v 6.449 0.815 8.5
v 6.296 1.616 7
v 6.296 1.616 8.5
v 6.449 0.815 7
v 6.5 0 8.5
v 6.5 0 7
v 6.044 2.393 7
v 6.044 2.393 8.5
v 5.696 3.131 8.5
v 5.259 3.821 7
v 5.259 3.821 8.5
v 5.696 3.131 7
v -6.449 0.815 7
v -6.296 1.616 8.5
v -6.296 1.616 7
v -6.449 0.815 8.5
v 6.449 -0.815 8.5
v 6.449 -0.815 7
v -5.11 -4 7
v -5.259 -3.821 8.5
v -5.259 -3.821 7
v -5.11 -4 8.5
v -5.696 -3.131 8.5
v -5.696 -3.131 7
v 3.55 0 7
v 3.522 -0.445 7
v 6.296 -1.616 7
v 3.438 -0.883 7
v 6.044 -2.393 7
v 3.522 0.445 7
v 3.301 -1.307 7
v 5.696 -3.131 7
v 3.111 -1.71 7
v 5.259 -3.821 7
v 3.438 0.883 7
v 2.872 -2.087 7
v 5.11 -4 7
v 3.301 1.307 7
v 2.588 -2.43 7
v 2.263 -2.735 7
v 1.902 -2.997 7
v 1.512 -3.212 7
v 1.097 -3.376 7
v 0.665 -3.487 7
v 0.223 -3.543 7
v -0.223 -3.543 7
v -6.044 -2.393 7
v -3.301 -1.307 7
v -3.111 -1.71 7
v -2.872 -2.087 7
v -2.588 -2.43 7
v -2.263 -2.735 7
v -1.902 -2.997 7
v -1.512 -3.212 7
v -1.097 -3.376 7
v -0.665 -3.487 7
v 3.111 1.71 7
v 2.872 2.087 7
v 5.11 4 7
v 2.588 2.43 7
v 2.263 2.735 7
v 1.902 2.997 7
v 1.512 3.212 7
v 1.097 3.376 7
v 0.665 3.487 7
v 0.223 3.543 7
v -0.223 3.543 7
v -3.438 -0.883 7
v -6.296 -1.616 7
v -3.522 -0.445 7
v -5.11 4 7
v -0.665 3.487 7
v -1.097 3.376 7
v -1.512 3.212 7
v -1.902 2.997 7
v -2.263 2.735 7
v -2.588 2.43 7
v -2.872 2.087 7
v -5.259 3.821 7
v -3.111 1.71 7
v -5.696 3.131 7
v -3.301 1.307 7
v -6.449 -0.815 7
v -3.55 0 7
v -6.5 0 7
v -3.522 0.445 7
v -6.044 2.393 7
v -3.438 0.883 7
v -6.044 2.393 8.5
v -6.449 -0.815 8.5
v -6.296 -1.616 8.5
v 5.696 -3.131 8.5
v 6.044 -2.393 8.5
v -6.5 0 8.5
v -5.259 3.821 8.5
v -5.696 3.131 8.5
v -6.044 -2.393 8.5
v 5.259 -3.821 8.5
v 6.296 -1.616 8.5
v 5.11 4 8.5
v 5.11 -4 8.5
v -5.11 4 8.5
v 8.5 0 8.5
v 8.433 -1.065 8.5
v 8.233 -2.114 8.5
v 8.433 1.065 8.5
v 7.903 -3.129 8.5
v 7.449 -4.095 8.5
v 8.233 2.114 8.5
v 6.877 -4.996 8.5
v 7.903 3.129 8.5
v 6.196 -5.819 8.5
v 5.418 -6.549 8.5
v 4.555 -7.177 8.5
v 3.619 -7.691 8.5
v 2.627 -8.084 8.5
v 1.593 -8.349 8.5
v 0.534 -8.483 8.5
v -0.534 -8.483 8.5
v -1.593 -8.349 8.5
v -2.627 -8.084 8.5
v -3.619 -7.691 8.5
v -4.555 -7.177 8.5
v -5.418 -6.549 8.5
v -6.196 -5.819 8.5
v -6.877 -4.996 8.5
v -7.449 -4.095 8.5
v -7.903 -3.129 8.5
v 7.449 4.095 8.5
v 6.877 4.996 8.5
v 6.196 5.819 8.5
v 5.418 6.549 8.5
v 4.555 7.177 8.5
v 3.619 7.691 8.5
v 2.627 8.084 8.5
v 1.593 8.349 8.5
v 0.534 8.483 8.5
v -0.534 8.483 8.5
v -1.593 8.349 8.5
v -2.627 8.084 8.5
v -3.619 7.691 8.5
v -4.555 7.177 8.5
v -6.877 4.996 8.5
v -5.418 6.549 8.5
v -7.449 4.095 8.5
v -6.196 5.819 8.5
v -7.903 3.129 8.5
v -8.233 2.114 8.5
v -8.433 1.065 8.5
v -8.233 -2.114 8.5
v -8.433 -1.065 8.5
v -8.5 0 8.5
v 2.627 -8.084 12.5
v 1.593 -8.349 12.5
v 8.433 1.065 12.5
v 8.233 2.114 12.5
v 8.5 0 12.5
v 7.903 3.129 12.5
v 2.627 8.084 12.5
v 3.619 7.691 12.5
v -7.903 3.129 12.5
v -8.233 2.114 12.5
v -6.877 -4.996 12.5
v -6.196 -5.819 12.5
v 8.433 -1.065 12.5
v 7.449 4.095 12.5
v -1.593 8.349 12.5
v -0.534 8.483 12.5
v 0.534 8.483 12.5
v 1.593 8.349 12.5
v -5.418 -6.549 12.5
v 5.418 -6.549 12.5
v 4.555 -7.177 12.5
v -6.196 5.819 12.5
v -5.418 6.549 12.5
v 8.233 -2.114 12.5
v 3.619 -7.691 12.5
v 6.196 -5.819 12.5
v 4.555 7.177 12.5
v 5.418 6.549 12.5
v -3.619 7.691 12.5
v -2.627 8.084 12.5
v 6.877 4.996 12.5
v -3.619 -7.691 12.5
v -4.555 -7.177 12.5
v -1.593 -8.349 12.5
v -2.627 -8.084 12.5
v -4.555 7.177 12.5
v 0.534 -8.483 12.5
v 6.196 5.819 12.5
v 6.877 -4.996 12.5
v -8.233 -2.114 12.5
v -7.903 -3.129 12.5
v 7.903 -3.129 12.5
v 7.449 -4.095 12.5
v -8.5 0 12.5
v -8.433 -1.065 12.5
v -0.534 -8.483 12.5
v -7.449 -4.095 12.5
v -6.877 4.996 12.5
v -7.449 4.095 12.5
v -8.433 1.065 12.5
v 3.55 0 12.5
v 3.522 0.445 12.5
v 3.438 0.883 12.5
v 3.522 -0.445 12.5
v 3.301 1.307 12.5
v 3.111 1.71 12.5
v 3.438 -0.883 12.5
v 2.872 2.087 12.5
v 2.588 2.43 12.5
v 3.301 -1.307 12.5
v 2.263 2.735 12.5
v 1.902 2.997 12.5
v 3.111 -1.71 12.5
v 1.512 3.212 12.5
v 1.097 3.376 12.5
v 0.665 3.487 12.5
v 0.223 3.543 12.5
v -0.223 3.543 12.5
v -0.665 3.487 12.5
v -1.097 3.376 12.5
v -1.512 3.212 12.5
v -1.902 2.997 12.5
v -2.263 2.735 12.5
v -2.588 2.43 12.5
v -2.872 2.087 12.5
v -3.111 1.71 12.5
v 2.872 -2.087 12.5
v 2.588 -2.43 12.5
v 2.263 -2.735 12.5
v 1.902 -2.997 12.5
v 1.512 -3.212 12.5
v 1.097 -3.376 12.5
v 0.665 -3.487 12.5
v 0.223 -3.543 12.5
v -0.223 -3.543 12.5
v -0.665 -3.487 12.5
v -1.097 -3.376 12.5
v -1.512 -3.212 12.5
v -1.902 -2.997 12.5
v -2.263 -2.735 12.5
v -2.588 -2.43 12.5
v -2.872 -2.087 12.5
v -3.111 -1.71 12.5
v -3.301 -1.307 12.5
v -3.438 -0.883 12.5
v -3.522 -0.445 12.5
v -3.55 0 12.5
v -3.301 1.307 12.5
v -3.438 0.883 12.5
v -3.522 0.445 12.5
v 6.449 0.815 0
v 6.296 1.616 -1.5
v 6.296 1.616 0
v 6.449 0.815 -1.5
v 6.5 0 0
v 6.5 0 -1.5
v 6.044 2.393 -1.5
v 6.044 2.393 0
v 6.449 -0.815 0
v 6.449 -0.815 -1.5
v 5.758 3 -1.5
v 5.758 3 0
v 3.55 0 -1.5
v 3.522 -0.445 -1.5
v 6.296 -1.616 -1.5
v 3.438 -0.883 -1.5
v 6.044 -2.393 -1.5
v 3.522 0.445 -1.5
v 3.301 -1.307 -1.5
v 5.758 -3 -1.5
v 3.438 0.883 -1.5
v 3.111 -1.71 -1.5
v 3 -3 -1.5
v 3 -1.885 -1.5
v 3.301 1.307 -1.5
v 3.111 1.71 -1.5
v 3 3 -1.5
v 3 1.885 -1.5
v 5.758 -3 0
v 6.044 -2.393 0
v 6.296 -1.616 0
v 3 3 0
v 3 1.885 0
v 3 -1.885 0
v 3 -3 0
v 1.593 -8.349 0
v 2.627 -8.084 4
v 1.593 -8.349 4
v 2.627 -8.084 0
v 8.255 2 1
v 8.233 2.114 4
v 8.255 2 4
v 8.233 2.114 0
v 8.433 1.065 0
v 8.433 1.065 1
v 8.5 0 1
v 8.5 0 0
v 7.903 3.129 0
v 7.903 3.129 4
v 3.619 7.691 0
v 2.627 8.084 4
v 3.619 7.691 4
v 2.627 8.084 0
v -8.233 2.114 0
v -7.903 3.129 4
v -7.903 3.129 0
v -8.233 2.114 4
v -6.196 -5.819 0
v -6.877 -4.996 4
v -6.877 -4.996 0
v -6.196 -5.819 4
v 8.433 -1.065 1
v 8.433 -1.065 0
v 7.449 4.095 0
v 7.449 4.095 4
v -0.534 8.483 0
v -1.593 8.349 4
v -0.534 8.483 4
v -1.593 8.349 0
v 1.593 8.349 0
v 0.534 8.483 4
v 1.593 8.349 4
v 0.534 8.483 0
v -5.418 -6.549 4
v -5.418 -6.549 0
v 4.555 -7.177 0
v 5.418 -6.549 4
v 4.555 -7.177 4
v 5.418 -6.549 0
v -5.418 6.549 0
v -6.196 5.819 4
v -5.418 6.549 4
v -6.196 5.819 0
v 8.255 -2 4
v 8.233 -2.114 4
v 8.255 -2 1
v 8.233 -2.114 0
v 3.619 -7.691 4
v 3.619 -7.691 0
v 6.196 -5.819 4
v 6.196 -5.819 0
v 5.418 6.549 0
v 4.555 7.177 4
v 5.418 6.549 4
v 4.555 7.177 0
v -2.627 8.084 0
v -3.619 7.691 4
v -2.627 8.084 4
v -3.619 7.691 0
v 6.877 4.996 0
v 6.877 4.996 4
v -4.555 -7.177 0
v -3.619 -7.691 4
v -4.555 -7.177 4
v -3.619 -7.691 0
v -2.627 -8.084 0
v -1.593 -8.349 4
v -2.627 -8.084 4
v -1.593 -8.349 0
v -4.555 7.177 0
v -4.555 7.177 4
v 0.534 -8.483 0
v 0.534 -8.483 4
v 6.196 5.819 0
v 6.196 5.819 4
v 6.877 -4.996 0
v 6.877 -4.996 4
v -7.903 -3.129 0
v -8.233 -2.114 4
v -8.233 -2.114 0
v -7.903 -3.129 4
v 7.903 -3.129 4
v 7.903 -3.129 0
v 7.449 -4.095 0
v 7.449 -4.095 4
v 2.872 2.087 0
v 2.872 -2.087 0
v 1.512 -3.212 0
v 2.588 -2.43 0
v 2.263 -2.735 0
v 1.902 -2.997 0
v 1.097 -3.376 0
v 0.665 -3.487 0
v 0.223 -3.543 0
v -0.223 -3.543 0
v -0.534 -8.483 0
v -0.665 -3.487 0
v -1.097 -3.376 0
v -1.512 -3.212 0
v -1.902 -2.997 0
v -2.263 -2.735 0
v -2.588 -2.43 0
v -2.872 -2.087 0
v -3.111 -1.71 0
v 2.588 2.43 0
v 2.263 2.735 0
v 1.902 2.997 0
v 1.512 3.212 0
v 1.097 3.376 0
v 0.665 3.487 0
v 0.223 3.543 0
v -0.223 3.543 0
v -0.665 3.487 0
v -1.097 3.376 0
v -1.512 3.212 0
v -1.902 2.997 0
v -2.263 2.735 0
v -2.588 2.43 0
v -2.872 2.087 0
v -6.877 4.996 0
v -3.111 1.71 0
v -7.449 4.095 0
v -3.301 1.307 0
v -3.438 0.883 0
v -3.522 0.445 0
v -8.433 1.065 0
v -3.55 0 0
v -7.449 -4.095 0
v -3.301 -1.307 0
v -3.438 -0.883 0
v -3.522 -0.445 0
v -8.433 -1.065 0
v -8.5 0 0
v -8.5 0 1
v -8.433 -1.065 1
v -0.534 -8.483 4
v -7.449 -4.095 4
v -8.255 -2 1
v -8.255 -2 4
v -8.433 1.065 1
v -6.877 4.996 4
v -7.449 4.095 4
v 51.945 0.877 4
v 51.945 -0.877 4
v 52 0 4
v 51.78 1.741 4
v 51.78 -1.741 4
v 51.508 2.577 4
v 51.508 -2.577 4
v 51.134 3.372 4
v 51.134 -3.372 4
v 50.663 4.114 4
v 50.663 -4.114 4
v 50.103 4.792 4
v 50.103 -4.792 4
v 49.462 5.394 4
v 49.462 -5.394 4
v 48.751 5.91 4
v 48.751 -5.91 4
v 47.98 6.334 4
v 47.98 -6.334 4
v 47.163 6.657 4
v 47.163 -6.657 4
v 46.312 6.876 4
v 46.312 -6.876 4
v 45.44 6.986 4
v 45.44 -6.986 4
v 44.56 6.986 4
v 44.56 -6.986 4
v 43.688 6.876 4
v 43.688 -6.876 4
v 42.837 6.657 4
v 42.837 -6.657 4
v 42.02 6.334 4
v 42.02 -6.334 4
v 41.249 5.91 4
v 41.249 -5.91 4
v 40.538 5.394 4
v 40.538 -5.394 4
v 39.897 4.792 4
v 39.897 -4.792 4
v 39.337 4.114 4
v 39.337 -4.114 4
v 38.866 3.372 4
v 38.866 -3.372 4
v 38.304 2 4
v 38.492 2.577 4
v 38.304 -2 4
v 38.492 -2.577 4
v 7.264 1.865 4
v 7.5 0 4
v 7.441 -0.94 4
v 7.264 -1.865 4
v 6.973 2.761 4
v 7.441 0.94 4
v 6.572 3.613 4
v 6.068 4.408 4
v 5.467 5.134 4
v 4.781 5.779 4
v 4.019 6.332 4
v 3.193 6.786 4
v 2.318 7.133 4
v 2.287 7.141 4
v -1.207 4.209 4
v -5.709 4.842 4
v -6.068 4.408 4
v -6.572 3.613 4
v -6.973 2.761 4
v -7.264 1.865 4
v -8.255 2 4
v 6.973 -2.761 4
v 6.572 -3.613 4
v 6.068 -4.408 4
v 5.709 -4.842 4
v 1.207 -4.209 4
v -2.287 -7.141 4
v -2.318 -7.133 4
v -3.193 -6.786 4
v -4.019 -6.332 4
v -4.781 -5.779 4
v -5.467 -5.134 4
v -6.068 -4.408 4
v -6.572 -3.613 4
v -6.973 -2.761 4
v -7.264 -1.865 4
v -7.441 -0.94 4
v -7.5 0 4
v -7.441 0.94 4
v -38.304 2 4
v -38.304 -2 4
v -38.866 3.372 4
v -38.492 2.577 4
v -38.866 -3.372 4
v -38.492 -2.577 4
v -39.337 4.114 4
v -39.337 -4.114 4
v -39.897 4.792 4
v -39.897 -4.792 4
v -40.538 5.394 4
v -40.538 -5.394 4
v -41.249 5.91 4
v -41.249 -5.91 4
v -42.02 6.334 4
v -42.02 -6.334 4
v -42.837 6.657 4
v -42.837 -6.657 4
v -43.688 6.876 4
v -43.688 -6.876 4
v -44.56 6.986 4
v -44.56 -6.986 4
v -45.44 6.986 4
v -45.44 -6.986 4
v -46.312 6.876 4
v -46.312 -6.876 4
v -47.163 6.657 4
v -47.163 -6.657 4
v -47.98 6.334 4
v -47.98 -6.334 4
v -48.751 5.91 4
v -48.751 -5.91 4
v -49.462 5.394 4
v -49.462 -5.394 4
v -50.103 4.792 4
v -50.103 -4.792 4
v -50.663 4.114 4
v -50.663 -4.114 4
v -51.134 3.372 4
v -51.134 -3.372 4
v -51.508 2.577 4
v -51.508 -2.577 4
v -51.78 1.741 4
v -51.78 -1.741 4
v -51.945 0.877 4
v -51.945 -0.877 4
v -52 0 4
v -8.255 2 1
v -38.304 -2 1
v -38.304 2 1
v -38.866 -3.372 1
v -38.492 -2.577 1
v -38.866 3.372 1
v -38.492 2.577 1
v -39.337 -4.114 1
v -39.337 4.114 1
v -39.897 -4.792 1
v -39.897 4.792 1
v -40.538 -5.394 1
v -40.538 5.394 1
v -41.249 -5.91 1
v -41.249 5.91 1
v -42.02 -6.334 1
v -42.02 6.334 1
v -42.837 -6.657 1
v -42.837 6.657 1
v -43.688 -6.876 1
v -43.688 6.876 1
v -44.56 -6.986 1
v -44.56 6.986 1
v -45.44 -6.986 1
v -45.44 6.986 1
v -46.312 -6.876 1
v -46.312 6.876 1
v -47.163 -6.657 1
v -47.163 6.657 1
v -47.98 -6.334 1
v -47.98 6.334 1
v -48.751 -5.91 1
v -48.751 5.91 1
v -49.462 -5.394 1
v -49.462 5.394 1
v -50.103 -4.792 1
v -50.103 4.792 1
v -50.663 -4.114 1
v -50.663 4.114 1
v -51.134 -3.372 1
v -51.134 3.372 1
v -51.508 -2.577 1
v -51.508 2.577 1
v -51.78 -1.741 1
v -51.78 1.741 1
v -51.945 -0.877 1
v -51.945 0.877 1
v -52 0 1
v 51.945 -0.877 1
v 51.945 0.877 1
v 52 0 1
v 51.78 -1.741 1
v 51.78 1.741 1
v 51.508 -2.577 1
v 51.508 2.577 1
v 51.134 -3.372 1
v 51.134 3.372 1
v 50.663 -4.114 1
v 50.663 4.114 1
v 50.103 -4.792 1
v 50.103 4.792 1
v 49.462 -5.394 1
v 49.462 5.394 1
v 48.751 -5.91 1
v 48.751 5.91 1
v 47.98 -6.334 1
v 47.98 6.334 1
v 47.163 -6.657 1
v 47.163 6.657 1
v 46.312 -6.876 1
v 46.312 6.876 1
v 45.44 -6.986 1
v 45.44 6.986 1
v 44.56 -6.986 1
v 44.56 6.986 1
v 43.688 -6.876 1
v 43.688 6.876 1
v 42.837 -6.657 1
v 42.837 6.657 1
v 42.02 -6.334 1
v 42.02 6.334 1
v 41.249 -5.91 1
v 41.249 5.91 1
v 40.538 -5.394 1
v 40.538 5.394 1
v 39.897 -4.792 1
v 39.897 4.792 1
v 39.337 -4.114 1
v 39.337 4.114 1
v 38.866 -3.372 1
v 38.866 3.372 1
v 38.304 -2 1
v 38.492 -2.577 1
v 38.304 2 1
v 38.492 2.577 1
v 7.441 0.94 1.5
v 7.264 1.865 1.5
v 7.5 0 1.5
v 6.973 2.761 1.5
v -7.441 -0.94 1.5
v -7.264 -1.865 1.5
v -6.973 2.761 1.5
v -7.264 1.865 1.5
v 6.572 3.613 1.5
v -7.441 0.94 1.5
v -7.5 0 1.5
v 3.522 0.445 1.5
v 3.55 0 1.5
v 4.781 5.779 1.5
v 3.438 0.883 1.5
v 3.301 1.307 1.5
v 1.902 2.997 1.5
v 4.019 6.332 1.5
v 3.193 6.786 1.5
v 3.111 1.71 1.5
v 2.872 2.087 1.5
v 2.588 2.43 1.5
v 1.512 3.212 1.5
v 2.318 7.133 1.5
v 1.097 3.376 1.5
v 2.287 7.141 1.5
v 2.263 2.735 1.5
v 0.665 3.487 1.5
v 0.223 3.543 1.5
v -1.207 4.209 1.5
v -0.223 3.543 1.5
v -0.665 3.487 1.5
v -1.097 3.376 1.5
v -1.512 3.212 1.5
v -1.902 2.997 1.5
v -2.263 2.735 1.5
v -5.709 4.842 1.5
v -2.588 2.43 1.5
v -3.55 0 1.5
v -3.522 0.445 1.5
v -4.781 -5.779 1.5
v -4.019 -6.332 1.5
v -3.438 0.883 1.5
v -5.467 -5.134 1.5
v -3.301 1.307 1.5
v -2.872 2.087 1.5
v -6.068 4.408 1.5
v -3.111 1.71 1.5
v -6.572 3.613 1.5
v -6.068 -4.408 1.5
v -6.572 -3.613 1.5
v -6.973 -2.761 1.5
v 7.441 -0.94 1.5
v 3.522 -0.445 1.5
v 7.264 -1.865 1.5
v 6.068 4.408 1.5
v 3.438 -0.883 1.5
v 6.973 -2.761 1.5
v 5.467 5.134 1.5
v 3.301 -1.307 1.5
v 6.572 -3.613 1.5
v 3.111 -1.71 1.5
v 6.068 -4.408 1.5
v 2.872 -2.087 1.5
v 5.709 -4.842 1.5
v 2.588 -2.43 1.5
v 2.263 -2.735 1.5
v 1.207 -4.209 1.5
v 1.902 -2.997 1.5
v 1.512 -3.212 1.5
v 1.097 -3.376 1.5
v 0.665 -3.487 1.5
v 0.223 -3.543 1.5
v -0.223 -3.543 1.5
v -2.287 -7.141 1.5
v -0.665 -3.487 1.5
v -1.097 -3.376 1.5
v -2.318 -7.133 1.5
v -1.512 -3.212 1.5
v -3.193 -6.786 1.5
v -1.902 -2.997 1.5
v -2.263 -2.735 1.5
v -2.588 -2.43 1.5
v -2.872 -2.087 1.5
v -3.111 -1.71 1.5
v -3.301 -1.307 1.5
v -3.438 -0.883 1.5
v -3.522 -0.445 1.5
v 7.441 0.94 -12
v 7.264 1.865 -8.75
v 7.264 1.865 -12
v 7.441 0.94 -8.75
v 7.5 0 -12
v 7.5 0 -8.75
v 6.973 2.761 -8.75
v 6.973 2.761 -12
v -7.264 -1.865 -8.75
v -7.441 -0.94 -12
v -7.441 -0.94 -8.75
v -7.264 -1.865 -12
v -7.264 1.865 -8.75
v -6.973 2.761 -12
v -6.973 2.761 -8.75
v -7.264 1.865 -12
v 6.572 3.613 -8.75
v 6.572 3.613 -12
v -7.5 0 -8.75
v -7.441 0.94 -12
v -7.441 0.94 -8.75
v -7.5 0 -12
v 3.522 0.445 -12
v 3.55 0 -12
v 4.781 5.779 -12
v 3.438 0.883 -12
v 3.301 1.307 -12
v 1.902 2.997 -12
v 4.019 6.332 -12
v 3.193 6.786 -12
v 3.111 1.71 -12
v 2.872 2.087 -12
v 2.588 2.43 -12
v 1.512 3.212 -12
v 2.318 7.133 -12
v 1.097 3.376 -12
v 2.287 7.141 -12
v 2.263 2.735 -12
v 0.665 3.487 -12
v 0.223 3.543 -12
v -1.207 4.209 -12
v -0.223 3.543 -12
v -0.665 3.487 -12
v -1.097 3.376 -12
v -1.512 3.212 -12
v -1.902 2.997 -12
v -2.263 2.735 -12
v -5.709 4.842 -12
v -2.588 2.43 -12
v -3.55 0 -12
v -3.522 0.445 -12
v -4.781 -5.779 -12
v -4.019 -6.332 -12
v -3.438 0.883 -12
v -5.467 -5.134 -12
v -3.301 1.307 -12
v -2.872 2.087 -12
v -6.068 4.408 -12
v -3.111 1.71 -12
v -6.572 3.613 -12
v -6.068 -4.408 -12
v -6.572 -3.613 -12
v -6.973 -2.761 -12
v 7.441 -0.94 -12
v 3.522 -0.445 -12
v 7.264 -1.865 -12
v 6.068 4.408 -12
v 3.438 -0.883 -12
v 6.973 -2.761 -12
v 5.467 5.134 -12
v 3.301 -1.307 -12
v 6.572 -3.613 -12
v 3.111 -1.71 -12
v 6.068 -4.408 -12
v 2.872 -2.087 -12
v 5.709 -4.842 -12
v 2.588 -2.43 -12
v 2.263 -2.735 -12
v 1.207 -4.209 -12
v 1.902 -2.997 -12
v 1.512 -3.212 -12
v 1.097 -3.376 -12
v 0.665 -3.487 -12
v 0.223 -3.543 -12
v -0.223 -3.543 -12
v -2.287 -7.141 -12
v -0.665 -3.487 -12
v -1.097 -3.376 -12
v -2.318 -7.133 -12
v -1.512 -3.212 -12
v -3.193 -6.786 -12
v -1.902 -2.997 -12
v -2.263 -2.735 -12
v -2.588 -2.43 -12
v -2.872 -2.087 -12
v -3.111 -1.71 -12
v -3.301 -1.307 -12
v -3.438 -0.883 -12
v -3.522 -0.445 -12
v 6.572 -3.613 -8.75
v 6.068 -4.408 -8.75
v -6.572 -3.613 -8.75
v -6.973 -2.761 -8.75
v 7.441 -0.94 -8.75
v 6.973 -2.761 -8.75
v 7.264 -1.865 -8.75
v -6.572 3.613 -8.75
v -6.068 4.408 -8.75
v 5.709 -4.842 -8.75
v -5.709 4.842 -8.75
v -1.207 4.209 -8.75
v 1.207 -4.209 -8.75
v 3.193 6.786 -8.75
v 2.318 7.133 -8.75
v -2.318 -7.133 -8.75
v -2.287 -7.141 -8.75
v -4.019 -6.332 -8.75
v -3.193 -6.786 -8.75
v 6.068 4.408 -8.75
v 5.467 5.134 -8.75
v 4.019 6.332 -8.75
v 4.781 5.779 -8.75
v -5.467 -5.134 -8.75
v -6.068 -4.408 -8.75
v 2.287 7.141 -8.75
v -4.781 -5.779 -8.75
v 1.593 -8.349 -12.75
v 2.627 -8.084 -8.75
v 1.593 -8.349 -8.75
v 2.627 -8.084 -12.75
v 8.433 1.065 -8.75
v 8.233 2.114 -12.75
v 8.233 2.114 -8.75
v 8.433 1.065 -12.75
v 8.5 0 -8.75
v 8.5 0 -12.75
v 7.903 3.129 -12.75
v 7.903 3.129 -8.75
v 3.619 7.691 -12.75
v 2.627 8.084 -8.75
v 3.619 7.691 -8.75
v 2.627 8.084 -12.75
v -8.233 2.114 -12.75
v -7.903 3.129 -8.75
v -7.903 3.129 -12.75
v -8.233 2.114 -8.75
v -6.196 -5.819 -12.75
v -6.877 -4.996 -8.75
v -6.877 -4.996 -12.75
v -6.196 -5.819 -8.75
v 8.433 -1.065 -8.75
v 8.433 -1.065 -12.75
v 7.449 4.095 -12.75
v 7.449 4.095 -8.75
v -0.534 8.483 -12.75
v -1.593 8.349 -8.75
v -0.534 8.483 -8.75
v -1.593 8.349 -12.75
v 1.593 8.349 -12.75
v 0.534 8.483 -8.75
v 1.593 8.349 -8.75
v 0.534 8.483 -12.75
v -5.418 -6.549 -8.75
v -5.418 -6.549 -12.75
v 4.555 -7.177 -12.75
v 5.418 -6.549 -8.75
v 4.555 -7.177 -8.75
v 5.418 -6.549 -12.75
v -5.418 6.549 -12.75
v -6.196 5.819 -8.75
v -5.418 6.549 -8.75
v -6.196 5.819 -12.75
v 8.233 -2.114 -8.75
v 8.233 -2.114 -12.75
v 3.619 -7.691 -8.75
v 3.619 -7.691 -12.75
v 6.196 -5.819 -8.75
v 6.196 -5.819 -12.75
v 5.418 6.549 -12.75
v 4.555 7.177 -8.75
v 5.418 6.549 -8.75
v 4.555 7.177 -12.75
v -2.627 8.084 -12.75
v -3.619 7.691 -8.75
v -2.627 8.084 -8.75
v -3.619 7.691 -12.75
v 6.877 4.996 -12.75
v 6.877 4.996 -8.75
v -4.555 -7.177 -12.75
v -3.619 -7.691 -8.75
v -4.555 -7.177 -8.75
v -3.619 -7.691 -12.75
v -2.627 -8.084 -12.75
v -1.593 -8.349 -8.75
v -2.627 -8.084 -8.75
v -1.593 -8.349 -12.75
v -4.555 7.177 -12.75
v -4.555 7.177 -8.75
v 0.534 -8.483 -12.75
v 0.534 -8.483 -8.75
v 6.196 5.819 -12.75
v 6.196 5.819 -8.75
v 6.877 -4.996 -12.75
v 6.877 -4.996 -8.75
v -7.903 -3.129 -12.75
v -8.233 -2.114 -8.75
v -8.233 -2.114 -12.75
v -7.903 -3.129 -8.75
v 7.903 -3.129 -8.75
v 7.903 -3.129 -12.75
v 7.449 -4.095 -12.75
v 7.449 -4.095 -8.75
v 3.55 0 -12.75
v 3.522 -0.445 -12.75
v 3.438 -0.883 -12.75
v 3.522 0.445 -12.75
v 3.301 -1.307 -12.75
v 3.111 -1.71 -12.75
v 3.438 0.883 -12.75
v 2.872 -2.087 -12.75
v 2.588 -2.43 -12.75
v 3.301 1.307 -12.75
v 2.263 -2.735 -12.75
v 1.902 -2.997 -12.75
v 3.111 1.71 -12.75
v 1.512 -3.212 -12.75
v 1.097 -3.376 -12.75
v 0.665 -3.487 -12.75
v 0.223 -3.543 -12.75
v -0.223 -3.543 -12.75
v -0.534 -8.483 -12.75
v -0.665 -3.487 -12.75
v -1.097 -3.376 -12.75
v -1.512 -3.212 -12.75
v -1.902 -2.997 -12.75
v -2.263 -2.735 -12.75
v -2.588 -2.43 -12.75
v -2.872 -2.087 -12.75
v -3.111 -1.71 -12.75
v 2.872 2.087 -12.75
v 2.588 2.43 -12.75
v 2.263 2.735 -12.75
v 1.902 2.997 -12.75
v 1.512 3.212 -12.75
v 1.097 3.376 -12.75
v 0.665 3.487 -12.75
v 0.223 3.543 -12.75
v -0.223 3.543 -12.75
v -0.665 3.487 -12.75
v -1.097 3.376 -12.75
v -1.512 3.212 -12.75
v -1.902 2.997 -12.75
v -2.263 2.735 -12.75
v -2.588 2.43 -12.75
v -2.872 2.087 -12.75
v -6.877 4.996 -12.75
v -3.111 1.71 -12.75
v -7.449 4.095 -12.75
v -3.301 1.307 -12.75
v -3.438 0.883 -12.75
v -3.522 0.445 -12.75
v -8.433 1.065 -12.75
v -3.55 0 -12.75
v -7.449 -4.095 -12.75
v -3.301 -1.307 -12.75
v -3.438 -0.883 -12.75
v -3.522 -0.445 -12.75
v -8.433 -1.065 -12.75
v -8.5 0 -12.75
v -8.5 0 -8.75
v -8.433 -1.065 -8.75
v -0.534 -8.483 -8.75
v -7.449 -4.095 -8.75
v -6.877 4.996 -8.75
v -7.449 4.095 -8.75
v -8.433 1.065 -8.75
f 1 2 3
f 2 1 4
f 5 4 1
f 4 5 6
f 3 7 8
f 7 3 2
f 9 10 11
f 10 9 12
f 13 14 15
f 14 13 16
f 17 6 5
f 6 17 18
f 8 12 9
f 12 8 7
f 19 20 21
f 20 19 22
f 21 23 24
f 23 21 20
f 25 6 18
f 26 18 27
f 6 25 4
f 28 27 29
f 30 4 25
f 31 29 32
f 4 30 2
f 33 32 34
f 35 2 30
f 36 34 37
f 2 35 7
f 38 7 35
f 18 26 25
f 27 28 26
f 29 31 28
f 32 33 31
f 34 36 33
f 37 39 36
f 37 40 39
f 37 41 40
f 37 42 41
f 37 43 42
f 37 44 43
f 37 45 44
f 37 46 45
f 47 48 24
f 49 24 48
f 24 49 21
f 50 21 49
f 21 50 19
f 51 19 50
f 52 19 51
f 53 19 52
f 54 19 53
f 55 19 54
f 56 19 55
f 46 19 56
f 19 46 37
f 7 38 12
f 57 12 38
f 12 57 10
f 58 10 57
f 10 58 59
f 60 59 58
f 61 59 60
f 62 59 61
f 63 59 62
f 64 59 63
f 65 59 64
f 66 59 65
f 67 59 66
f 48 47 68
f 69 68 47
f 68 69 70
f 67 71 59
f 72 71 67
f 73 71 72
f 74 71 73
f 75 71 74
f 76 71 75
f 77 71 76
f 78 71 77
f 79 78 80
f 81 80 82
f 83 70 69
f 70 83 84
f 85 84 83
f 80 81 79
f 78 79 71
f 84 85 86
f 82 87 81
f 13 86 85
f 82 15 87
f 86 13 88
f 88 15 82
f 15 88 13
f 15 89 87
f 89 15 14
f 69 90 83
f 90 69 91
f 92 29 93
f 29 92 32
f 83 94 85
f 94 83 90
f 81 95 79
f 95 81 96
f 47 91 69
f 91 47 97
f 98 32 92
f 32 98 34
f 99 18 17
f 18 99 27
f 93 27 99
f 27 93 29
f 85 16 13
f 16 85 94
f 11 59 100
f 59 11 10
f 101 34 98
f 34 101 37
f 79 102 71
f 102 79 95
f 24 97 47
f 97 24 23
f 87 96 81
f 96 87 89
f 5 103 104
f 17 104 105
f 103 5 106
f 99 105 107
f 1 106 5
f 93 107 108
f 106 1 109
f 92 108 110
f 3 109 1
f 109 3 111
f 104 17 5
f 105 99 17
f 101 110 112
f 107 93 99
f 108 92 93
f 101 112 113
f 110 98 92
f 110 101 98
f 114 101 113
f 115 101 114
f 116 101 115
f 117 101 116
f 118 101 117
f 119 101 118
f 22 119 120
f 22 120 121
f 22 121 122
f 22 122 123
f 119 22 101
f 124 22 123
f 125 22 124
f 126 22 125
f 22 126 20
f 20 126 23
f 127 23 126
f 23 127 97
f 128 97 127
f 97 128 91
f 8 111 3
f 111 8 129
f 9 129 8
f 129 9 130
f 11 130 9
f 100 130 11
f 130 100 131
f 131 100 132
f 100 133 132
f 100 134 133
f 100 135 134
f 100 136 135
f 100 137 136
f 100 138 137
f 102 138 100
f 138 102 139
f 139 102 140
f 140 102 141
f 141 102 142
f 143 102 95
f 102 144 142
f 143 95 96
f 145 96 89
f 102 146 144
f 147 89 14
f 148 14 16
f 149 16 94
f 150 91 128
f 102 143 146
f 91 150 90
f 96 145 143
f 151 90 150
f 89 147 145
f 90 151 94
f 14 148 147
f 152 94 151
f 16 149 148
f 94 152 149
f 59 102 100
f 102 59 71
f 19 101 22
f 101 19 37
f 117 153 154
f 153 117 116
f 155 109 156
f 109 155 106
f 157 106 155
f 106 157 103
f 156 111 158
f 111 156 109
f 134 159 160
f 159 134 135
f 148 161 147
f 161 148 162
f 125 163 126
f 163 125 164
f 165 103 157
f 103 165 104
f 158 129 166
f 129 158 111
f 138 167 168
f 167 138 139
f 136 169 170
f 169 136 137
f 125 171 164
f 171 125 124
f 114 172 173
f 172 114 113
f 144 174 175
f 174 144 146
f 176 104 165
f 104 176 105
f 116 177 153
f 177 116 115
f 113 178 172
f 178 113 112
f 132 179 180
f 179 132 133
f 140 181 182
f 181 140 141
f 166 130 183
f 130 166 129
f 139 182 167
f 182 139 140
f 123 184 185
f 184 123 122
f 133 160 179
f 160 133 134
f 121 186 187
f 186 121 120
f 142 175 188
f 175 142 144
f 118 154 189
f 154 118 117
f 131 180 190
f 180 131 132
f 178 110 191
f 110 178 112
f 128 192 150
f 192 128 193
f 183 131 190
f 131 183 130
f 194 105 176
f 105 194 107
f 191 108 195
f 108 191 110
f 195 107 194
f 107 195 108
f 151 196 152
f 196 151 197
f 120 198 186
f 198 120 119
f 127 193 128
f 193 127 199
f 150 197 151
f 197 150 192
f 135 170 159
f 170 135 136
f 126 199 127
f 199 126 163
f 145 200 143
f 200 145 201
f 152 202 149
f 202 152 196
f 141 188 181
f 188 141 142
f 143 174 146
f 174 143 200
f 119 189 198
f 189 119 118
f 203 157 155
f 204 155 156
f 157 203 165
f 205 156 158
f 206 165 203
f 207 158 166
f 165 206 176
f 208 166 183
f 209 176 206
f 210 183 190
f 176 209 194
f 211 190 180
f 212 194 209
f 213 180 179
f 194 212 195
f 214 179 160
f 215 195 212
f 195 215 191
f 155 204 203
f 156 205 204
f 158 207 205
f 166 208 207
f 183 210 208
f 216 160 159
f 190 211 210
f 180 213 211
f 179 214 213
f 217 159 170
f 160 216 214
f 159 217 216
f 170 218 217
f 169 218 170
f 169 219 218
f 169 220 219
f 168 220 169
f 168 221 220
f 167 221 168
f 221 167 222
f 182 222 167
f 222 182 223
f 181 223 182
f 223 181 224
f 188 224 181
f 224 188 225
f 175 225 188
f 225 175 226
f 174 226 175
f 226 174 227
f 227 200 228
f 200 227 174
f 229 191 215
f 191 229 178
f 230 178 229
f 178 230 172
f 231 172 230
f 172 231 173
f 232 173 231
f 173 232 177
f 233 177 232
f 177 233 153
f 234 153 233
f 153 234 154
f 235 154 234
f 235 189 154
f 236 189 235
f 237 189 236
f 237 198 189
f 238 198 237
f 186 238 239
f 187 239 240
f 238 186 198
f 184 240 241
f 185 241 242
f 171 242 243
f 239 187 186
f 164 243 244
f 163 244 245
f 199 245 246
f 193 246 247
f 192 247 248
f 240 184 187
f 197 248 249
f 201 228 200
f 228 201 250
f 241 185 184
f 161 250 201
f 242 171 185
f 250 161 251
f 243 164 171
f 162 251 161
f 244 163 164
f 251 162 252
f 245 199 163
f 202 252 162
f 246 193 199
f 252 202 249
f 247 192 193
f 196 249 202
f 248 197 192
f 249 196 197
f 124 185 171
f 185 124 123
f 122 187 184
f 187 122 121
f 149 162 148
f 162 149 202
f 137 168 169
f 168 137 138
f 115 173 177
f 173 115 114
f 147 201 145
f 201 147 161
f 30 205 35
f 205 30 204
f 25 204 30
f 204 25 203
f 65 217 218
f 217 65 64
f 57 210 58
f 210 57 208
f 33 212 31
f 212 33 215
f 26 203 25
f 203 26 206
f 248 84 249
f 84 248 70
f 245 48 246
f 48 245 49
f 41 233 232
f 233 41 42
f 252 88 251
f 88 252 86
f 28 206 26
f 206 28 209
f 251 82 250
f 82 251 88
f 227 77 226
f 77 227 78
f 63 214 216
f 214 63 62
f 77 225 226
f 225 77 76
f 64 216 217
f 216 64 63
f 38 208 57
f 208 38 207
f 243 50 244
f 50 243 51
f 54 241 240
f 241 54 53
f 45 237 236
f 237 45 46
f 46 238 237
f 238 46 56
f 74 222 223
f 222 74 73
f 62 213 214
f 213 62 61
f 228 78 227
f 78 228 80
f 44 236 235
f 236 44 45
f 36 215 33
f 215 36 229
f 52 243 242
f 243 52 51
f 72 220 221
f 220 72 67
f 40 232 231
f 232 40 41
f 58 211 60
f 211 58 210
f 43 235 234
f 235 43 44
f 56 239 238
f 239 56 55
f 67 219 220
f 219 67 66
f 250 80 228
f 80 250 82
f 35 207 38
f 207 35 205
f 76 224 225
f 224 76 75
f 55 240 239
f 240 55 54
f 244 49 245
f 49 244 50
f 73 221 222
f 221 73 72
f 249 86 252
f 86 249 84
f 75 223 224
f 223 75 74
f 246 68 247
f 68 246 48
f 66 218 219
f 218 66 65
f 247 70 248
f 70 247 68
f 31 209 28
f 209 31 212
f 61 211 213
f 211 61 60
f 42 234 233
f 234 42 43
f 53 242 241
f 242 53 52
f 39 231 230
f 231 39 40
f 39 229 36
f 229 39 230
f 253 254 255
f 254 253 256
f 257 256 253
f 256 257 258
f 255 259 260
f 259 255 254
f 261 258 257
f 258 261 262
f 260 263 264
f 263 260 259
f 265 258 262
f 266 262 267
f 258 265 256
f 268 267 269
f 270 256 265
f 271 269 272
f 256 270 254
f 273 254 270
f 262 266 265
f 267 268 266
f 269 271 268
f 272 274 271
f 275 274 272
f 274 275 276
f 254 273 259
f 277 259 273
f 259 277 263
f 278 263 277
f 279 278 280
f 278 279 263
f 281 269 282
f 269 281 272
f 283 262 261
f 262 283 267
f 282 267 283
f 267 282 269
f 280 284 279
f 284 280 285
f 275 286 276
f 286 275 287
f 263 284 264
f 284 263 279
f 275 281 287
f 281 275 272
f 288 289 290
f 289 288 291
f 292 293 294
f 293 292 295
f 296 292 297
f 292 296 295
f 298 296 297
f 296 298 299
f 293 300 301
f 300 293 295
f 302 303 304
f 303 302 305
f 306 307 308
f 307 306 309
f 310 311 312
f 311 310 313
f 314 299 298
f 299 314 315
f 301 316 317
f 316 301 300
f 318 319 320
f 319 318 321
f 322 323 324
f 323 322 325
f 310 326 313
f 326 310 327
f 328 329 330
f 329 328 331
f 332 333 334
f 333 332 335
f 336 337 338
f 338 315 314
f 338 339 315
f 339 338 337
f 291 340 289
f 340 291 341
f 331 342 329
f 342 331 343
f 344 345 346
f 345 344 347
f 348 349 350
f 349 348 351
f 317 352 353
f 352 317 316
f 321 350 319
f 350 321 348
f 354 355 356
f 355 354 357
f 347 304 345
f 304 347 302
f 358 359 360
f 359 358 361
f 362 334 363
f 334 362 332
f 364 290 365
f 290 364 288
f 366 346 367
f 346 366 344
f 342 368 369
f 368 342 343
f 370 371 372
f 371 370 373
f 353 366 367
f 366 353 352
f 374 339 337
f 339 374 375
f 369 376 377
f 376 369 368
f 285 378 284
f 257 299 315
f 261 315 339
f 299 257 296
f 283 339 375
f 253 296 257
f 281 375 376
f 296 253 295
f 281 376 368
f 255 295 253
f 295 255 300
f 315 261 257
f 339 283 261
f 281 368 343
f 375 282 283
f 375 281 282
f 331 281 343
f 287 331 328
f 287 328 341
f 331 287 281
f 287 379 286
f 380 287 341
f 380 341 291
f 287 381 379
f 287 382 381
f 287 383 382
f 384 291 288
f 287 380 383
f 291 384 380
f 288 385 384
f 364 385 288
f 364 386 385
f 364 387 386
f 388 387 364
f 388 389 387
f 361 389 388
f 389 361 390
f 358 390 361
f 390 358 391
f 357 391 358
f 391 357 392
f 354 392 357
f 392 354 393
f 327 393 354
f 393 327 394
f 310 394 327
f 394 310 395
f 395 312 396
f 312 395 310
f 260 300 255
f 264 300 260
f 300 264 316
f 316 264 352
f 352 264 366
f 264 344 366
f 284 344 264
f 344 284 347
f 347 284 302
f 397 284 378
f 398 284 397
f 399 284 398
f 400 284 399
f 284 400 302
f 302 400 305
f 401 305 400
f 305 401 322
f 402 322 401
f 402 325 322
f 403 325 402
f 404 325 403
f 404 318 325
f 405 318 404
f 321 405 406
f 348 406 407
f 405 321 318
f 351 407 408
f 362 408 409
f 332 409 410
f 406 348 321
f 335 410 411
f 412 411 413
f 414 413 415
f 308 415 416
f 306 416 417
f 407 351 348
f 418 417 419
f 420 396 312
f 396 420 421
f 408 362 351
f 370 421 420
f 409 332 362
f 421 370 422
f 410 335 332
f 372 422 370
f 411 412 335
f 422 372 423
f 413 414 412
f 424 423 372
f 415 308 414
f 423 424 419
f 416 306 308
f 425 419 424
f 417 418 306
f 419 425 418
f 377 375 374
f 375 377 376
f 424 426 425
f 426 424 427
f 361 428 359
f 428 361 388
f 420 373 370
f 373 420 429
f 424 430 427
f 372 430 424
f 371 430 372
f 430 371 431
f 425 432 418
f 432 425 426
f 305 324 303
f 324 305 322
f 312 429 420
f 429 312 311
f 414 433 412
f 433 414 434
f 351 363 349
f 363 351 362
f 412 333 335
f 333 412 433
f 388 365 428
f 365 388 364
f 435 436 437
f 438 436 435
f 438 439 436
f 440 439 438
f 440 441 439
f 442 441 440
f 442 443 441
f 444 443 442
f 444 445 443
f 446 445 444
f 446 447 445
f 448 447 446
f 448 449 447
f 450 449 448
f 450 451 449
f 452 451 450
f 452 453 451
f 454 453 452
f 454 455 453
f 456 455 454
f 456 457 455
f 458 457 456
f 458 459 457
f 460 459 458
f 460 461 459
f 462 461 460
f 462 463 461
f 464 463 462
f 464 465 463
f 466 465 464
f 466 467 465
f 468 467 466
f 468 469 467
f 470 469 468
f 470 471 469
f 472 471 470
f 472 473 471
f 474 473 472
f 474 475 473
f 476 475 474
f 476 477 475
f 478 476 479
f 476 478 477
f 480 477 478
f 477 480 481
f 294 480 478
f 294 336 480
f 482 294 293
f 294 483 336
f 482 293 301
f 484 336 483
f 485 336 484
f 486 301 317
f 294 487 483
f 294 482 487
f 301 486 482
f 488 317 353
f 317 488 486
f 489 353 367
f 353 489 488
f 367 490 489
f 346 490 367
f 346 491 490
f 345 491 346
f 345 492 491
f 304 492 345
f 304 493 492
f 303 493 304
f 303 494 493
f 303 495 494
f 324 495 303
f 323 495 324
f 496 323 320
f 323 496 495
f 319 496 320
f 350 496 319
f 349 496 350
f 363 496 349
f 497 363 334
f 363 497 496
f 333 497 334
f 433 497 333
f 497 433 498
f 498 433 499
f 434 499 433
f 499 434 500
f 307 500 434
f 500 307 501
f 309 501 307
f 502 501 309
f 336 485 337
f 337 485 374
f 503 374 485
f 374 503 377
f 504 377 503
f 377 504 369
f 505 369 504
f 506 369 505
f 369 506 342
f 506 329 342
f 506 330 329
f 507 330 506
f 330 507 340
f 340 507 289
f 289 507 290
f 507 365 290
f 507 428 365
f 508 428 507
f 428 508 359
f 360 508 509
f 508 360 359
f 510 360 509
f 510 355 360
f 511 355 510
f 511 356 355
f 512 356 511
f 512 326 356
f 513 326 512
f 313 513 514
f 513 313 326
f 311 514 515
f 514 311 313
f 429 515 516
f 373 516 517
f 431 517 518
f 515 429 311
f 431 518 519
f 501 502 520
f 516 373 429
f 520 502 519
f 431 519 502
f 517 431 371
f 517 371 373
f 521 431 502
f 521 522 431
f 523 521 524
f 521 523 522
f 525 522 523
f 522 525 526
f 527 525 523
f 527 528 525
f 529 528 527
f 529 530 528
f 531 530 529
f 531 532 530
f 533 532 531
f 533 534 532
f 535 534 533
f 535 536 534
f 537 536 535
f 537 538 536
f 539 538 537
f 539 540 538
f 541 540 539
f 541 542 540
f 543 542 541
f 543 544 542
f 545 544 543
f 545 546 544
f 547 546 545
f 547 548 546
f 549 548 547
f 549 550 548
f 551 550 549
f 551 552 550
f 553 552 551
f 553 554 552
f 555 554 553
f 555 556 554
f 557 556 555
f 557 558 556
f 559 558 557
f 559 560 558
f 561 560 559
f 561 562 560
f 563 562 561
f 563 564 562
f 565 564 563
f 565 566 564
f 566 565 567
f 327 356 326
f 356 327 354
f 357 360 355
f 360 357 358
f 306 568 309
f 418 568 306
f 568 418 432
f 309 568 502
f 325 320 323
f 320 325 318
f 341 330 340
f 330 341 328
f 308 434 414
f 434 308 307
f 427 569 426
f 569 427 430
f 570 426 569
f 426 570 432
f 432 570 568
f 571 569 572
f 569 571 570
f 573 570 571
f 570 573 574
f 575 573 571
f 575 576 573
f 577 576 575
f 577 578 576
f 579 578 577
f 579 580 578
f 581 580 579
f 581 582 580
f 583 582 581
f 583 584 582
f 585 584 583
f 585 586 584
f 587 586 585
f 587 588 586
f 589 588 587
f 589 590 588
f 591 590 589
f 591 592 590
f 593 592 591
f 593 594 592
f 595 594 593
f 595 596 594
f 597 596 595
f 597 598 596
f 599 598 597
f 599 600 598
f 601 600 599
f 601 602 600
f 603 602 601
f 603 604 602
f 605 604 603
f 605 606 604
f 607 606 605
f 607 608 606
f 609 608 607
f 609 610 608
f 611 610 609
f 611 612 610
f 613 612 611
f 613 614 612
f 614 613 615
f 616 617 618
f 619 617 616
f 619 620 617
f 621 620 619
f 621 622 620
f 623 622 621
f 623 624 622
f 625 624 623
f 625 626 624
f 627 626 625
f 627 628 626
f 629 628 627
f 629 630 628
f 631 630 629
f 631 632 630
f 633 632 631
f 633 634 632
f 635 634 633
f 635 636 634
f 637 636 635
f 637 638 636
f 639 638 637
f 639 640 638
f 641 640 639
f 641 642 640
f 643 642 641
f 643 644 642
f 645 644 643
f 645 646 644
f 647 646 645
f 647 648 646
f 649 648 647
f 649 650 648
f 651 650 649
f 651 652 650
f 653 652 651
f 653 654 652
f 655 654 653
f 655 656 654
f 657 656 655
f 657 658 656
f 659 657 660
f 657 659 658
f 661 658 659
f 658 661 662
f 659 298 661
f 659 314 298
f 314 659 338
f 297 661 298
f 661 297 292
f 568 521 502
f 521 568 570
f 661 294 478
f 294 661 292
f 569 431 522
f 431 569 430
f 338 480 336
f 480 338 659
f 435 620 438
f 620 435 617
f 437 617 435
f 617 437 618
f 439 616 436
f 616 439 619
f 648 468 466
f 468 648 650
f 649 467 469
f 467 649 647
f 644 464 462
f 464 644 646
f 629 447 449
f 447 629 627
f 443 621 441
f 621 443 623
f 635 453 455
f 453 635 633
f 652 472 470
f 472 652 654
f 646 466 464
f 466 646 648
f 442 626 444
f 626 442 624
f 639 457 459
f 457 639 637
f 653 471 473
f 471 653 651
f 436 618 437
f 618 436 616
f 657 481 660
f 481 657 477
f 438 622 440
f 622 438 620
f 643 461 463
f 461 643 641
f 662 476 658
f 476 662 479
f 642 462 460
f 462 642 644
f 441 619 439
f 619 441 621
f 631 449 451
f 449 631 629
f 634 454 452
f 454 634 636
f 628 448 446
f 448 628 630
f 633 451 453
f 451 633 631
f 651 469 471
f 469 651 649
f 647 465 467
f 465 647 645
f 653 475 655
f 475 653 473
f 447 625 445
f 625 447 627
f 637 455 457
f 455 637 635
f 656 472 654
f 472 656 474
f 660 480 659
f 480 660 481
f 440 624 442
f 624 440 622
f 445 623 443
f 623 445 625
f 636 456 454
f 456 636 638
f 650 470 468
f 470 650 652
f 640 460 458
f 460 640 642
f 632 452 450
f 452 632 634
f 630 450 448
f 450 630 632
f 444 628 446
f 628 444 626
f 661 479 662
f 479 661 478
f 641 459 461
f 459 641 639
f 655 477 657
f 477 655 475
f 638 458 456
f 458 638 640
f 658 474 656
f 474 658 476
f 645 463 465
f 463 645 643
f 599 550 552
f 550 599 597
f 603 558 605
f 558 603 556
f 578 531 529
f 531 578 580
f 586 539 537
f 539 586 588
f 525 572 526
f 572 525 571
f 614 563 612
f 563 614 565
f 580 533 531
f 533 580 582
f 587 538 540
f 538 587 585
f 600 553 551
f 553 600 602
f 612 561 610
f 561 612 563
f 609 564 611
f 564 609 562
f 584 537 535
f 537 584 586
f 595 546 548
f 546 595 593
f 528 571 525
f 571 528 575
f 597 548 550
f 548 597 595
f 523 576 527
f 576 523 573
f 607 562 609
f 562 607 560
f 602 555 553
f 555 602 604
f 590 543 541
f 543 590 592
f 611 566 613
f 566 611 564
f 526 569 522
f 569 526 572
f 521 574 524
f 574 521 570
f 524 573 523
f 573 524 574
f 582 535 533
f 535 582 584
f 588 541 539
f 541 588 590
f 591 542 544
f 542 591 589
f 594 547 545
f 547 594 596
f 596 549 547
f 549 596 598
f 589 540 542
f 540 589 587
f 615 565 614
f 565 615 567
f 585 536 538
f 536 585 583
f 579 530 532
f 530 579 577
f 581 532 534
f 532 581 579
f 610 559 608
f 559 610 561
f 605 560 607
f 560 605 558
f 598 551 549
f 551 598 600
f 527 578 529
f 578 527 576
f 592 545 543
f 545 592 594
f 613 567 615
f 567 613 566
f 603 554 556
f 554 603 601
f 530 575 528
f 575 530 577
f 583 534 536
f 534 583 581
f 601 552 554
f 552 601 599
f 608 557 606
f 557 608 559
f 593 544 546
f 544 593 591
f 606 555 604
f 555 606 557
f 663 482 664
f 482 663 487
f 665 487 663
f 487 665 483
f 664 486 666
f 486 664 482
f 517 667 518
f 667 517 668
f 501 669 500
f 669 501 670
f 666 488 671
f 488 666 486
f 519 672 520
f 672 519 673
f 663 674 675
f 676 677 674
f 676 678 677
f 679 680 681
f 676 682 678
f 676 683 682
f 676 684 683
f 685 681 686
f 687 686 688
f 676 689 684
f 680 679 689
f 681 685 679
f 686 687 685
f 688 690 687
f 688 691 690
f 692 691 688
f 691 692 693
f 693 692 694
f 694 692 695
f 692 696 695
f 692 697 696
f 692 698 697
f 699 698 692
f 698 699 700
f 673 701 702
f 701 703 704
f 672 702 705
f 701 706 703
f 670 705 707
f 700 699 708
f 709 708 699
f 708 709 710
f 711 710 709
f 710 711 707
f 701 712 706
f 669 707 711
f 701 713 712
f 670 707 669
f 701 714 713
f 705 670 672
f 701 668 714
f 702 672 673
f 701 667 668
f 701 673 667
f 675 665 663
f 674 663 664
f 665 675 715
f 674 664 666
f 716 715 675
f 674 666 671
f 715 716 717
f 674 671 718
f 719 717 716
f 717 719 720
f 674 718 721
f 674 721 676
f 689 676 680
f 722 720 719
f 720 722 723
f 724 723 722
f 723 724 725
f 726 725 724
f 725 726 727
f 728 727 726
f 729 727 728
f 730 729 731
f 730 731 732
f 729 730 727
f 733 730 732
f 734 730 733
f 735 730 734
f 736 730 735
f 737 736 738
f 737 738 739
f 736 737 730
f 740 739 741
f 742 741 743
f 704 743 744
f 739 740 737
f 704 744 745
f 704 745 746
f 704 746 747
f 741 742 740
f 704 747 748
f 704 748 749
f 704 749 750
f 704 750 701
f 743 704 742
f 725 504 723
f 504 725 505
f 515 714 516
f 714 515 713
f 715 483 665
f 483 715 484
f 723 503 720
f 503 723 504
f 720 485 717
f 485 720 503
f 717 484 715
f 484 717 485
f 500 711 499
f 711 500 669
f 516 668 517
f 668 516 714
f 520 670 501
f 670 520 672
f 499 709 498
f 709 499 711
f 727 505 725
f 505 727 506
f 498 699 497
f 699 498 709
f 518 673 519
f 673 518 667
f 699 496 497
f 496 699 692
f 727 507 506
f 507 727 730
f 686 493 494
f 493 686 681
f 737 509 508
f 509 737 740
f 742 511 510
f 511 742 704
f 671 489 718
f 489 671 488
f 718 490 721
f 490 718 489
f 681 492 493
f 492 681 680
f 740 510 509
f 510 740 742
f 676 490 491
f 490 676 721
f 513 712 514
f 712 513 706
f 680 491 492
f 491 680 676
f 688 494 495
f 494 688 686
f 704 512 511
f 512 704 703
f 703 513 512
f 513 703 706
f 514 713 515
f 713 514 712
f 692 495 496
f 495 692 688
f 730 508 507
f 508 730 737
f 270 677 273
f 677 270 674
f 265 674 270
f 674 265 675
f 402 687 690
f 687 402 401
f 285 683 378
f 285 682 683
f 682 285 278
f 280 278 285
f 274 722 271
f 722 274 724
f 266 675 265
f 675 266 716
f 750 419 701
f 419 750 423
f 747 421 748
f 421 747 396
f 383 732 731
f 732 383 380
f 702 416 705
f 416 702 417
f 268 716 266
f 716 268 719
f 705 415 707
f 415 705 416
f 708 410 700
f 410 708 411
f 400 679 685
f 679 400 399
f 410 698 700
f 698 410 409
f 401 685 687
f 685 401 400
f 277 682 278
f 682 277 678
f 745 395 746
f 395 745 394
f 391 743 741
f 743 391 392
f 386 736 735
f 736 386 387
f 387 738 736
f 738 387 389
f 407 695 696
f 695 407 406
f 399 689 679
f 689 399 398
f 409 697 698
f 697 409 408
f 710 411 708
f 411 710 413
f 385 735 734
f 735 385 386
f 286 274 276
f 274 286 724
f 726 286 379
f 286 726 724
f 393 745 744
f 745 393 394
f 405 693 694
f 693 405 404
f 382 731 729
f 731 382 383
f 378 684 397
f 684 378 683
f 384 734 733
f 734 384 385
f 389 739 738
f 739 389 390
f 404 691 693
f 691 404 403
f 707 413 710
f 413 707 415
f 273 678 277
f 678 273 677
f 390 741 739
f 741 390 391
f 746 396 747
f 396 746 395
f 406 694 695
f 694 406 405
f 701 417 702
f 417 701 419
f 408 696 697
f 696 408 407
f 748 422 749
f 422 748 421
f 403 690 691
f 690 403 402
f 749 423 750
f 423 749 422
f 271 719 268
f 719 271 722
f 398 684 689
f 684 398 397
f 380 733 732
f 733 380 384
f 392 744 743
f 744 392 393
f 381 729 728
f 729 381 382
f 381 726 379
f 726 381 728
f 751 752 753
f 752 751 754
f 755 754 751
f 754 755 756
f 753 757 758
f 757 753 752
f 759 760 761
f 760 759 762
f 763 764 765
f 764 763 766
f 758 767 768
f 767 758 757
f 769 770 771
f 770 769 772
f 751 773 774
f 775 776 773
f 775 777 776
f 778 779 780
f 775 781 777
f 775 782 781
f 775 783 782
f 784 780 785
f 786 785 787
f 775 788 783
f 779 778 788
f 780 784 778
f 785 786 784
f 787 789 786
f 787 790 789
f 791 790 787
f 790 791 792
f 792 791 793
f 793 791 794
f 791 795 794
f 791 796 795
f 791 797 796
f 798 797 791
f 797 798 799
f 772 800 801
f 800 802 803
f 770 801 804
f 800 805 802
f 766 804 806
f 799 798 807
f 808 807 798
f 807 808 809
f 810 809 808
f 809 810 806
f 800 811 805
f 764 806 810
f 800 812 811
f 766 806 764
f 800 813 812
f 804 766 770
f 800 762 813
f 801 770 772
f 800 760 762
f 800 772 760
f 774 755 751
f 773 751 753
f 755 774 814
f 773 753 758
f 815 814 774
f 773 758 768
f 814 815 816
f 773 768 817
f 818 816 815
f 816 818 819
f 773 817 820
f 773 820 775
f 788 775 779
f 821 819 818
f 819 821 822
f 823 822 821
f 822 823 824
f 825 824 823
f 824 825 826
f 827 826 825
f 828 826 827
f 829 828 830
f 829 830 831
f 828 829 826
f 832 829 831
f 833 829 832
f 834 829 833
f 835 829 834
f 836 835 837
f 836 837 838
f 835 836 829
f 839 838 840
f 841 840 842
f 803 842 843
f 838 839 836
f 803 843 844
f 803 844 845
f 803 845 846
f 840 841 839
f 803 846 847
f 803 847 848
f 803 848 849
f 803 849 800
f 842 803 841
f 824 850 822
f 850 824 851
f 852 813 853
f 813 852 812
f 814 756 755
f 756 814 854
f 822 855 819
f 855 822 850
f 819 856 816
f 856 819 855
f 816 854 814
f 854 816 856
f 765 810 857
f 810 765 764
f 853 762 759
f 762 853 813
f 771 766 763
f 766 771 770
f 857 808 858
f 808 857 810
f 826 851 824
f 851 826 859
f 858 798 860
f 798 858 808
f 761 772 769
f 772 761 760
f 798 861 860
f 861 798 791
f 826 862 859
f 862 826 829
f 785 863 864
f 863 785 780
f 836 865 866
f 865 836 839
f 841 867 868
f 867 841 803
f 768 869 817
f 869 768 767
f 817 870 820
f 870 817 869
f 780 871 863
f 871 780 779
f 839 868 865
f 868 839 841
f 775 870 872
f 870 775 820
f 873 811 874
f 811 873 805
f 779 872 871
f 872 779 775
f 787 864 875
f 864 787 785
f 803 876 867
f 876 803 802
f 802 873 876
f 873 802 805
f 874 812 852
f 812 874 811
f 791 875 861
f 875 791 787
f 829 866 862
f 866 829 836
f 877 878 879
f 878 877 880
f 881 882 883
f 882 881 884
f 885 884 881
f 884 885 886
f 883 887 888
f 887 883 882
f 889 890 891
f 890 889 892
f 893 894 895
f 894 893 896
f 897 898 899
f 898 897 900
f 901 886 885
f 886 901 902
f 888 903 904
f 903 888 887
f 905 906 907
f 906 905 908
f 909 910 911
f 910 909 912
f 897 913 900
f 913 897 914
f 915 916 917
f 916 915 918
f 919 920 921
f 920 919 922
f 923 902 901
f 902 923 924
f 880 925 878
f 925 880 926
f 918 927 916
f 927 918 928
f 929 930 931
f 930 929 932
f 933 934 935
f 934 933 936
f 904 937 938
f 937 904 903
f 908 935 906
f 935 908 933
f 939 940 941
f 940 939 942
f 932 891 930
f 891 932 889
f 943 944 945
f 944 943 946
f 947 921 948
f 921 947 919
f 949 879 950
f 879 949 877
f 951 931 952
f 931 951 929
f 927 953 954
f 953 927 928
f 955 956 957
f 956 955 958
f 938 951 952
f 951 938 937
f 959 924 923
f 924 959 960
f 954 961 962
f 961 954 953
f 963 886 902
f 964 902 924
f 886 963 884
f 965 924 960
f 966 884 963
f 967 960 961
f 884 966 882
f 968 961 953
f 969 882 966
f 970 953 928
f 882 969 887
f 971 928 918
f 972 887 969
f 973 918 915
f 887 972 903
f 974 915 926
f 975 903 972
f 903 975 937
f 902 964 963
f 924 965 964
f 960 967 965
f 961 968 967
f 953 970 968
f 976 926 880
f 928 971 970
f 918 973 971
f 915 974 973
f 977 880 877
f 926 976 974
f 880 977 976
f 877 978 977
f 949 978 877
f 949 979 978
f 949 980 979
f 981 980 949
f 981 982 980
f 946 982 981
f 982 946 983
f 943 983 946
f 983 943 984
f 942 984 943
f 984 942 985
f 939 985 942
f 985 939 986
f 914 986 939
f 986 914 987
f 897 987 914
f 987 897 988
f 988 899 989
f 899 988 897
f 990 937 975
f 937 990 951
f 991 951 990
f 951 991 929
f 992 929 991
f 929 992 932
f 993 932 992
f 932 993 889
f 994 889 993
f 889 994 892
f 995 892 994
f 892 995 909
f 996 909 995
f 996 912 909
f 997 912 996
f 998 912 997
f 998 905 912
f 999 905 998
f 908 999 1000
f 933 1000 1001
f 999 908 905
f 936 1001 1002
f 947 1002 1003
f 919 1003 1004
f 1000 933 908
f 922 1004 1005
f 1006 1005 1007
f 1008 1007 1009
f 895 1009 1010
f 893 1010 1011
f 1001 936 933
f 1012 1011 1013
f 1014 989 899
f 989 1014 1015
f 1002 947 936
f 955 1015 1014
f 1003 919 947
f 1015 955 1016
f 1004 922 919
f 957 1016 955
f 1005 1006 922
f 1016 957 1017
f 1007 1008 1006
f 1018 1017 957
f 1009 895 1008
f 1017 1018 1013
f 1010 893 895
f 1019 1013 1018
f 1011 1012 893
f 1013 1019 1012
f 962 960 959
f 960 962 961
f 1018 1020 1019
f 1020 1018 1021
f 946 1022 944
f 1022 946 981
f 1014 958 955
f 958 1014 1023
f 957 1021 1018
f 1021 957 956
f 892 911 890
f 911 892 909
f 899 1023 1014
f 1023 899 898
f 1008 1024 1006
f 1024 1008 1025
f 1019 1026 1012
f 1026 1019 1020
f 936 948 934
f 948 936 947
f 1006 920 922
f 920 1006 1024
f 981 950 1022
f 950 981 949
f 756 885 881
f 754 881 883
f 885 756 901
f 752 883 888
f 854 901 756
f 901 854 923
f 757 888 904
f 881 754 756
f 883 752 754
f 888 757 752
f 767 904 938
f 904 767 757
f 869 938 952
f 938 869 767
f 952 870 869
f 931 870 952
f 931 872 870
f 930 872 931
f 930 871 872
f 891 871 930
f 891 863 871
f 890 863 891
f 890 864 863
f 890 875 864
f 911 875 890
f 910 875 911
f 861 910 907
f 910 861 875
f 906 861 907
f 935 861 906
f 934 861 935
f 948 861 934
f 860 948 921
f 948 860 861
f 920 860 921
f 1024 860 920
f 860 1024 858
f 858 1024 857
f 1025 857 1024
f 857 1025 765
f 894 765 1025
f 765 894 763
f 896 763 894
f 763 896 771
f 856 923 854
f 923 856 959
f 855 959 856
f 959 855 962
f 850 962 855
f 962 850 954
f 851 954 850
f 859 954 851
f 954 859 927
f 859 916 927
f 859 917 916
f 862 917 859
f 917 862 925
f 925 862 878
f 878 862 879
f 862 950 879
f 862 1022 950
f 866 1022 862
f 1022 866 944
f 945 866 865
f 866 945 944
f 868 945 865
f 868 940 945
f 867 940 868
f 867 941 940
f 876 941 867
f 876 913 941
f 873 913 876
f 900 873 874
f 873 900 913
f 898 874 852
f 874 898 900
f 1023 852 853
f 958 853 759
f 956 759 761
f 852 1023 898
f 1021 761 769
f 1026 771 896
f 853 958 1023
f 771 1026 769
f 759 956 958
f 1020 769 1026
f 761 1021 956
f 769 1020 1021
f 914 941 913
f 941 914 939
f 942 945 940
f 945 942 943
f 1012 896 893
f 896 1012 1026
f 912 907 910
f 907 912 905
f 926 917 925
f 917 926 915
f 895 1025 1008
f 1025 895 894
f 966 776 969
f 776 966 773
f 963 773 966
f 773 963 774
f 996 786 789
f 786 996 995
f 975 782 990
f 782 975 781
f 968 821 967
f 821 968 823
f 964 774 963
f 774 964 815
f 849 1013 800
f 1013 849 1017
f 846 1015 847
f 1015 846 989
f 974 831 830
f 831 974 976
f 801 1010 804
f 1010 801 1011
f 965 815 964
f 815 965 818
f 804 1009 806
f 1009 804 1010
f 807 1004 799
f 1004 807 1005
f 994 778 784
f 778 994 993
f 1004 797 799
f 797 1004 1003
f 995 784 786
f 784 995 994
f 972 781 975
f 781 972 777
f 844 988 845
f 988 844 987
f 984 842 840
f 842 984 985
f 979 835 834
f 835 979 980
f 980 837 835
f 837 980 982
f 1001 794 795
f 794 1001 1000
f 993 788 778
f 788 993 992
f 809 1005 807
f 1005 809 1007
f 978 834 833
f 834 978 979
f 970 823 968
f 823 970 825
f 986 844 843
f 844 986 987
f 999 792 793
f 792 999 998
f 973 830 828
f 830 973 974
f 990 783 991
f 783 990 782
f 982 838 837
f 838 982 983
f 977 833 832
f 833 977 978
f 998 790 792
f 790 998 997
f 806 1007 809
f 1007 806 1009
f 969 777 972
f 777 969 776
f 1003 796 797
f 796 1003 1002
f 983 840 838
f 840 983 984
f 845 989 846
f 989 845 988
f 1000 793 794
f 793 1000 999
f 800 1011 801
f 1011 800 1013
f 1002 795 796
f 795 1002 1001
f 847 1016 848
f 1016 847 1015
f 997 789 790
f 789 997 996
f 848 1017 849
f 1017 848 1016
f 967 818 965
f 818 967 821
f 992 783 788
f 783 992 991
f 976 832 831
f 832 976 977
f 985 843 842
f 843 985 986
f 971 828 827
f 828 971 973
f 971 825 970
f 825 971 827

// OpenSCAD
//Number of spinners
spinners=1;			// [3:1:20]

// Rotation preview
rotatePreview=40;		//[8,-45]

/* Hidden */
startDist=45;			//initial distance for spinner. Minimum of (ballWidth+connectorWidth)/2
distStep=0;				//increment in distance for each spinner
ballWidth=14;			//width of balls on each spinner
ballHeight=3;			//height of balls on each spinner
barHeight=3;			
barWidth=4;
connectorWidth=17;		//width of connector in middle of spinner
indent=2.5;				//depth of indentation in connector
extrude=1.5;				//depth of extrusion from connector
margin=1;				//extra height between balls
dowel=7.1;				//dowel diameter

module spinner(dist){
	//central holder for dowel
	difference(){
		//main section
		union(){
			//cylinder
			translate([0,0,0]) cylinder(h=ballHeight+margin, r=connectorWidth/2, $fn=50);
			//bar
			translate([-dist,-barWidth/2,margin+ballHeight-barHeight]) cube(size=[dist*2,barWidth,barHeight]);
			//balls on ends
			translate([dist,0,margin]) cylinder(h=ballHeight, r=ballWidth/2, $fn=50);
			translate([-dist,0,margin]) cylinder(h=ballHeight,r=ballWidth/2, $fn=50);
			//male connector
			translate([0,0,-extrude]) 
			intersection(){
				cylinder(h=ballHeight+margin, r=connectorWidth/2-2, $fn=50);
				translate([13,0,0]) cube(size=[20,6,10], center=true);
			}
		}
		//indented space on top
		//first group allows for 8 degree twist one way
		translate([0,0,ballHeight+margin-indent]) 
		intersection(){
			cylinder(h=ballHeight+1, r=connectorWidth/2-1, $fn=50);
			rotate([0,0,-8]) cube(size=[20,8,10], center=true);
		}
		//second group allows 40 degree twist other way
		translate([0,0,ballHeight+margin-indent]) 
		intersection(){
			cylinder(h=ballHeight+1, r=connectorWidth/2-1, $fn=50);
			rotate([0,0,40]) cube(size=[20,8,10], center=true);
		}
		//cylinder to cut out middle for dowel
		translate([0,0,-25]) cylinder(h=50, r=dowel/2, $fn=50);
	}
}

//top cap
 difference(){
	union(){	
		//main section
		translate([0,0,(ballHeight+margin+extrude+3)]) cylinder(h=ballHeight+margin, r=connectorWidth/2, $fn=50);
		//male connector
		translate([0,0,(ballHeight+margin+extrude+3)-extrude]) 
		intersection(){
			cylinder(h=ballHeight, r=connectorWidth/2-2, $fn=50);
			cube(size=[20,8,ballHeight], center=true);
		}
	}
	translate([0,0,-100]) cylinder(h=200, r=dowel/2,  $fn=50);
}

//spinners
for (i = [0:spinners-1]) {
	translate([0,0,-i*(ballHeight+margin+extrude+3)])rotate([0,0,rotatePreview*i]) spinner(i*distStep+startDist);
}

//bottom cap
rotate ([0,0,0]) translate([0,0,-(ballHeight+margin+extrude+3)*spinners-3])
	difference(){
		//main section
		translate([0,0,-(ballHeight/2+1)/2]) cylinder(h=ballHeight+margin, r=connectorWidth/2,  $fn=50);
		//indented space on top
		//first group allows for 8 degree twist one way
		translate([0,0,ballHeight/2-indent+margin/2]) 
		intersection(){
			cylinder(h=ballHeight+1, r=connectorWidth/2-1,  $fn=50);
			rotate([0,0,-8]) cube(size=[20,8,10], center=true);
		}
		//second group allows 45 degree twist other way
		translate([0,0,ballHeight/2-indent+margin/2]) 
		intersection(){
			cylinder(h=ballHeight+1, r=connectorWidth/2-1,  $fn=50);
			rotate([0,0,40]) cube(size=[20,8,10], center=true);
		}
		//dowel cutout
		translate([0,0,-180]) cylinder(h=200, r=dowel/2,  $fn=50);
	}
	
	
